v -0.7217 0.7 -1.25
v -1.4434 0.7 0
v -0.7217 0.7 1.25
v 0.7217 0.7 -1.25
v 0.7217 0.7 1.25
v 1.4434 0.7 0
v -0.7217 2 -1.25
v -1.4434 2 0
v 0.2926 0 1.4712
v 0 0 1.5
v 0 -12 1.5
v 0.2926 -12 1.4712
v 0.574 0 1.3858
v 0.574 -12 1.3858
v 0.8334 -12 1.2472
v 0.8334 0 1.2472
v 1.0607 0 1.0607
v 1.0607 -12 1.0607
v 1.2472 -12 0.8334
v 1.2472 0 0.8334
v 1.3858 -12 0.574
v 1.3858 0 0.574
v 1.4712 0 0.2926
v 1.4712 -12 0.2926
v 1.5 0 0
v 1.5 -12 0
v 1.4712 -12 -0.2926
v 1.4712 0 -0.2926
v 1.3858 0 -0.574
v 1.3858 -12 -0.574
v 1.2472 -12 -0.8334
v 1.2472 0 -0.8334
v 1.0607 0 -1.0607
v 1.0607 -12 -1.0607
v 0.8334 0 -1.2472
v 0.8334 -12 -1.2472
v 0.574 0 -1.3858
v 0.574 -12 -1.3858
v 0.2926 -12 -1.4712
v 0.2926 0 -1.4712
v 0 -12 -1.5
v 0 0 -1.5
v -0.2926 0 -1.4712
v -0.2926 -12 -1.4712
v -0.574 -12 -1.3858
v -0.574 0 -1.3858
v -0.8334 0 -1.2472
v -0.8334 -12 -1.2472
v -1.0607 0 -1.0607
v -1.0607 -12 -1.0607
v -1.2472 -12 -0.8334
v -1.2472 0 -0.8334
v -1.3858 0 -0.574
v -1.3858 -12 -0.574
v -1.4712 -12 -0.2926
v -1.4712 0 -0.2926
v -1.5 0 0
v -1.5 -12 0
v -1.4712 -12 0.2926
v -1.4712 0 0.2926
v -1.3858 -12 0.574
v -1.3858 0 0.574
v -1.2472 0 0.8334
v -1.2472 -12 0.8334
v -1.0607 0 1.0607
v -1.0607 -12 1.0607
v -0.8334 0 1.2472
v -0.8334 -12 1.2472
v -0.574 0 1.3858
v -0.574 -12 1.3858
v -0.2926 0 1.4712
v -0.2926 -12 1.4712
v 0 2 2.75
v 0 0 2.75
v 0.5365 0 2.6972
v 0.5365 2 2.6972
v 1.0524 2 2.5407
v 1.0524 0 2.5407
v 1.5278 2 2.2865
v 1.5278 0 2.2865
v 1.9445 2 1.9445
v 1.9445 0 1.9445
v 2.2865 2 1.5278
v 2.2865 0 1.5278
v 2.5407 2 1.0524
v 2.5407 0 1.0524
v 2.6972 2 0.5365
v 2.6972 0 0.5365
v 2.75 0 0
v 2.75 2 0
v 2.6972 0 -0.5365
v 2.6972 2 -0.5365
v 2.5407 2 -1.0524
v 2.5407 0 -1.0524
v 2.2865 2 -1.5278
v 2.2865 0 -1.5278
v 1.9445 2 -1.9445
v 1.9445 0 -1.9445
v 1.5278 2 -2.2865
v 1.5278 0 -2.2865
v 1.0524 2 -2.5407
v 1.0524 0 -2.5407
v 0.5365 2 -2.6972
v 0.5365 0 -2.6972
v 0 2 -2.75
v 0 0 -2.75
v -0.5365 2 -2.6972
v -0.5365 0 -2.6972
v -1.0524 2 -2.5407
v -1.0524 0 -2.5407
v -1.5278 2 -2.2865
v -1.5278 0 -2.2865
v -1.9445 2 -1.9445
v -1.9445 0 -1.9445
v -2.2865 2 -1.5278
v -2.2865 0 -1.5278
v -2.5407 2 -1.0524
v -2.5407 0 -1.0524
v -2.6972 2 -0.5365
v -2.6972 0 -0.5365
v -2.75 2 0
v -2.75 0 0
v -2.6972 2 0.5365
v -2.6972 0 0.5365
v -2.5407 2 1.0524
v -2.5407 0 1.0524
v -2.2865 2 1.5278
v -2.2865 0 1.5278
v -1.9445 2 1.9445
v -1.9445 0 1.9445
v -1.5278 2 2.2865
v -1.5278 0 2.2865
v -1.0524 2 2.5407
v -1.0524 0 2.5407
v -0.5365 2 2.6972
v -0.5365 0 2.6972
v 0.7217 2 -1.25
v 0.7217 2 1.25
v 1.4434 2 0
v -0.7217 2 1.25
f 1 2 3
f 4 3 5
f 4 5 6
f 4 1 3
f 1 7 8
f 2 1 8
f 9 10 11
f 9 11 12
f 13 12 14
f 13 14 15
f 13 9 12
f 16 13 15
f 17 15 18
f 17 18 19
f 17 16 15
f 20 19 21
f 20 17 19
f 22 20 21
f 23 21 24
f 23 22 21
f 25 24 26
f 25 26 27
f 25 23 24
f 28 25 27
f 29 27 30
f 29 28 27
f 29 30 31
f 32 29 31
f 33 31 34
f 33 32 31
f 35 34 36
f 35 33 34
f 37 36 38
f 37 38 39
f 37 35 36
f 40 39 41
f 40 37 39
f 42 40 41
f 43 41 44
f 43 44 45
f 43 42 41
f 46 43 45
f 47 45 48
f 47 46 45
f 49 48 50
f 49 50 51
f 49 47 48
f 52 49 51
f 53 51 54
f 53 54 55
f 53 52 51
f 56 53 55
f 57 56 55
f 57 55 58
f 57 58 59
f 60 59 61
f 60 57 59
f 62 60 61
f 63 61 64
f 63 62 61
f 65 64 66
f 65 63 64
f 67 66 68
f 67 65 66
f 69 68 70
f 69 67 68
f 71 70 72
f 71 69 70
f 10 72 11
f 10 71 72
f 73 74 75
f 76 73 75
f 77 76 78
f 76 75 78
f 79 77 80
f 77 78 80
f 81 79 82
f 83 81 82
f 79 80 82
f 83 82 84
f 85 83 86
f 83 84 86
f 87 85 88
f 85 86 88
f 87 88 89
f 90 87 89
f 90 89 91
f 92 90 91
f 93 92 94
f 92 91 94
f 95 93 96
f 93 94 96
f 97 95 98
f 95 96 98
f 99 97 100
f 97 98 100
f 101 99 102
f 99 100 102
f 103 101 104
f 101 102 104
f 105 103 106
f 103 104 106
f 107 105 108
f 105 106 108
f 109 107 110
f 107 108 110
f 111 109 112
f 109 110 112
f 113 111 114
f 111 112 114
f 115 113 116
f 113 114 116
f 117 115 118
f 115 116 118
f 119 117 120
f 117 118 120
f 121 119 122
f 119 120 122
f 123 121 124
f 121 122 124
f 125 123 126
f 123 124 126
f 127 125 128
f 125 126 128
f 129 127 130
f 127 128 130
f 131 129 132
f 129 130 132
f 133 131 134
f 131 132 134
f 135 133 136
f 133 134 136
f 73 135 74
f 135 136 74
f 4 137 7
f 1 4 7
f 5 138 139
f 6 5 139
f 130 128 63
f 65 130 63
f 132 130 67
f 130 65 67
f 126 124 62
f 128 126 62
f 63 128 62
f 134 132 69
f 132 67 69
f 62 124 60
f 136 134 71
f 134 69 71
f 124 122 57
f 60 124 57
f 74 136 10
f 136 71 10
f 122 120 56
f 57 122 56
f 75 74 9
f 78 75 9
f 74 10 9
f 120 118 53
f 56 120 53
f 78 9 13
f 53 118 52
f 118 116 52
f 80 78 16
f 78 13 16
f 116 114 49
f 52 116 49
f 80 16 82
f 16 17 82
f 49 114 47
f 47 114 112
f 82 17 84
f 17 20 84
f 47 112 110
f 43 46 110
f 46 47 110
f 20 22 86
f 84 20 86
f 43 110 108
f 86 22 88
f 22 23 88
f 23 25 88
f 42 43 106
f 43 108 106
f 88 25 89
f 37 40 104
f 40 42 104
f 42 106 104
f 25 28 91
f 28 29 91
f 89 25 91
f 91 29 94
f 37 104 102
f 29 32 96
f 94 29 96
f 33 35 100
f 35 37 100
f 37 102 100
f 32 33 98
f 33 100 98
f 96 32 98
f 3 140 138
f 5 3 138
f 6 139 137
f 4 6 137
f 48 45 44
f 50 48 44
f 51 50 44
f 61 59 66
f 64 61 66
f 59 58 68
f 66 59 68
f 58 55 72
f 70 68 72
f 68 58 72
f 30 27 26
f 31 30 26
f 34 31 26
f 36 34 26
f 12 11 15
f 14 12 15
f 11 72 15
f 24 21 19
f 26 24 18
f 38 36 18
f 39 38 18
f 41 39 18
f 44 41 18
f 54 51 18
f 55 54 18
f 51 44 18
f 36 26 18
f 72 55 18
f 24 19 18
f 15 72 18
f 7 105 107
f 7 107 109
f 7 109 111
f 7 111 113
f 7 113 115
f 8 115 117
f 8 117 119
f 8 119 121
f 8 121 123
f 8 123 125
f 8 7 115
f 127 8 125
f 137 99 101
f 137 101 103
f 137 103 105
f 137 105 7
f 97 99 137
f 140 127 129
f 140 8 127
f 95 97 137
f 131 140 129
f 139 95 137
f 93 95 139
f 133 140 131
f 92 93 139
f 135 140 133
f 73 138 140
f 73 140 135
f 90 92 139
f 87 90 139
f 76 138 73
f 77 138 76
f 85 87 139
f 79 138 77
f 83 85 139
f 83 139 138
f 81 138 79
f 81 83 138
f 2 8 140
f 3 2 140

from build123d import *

# Parameters (mm, degrees)
SKETCH_1_R          = 2.75
EXTRUDE_397_DEPTH   = 2
SKETCH_1_3_R        = 1.5
EXTRUDE_432_DEPTH   = 12
CUT_EXTRUDE_1_DEPTH = 1.3


with BuildPart() as part:
    # 草图1 → Extrude 397 (new body)
    with BuildSketch(Plane(origin=(0, 0, 0), x_dir=(1, 0, 0), z_dir=(0, 1, 0))):
        Circle(SKETCH_1_R)
    extrude(amount=EXTRUDE_397_DEPTH)

    # 草图1<3> → Extrude 432 (add)
    with BuildSketch(Plane(origin=(0, 0, 0), x_dir=(1, 0, 0), z_dir=(0, 1, 0))):
        Circle(SKETCH_1_3_R)
    extrude(amount=-EXTRUDE_432_DEPTH)

    # 草图2 → 切除-拉伸1 (cut)
    with BuildSketch(Plane(origin=(0, 2, 0), x_dir=(1, 0, 0), z_dir=(0, 1, 0))):
        Polygon((1.443375673, 0), (0.721687836, 1.25), (-0.721687836, 1.25), (-1.443375673, 0), (-0.721687836, -1.25), (0.721687836, -1.25), align=None)
    extrude(amount=-CUT_EXTRUDE_1_DEPTH, mode=Mode.SUBTRACT)


solid = part.part
